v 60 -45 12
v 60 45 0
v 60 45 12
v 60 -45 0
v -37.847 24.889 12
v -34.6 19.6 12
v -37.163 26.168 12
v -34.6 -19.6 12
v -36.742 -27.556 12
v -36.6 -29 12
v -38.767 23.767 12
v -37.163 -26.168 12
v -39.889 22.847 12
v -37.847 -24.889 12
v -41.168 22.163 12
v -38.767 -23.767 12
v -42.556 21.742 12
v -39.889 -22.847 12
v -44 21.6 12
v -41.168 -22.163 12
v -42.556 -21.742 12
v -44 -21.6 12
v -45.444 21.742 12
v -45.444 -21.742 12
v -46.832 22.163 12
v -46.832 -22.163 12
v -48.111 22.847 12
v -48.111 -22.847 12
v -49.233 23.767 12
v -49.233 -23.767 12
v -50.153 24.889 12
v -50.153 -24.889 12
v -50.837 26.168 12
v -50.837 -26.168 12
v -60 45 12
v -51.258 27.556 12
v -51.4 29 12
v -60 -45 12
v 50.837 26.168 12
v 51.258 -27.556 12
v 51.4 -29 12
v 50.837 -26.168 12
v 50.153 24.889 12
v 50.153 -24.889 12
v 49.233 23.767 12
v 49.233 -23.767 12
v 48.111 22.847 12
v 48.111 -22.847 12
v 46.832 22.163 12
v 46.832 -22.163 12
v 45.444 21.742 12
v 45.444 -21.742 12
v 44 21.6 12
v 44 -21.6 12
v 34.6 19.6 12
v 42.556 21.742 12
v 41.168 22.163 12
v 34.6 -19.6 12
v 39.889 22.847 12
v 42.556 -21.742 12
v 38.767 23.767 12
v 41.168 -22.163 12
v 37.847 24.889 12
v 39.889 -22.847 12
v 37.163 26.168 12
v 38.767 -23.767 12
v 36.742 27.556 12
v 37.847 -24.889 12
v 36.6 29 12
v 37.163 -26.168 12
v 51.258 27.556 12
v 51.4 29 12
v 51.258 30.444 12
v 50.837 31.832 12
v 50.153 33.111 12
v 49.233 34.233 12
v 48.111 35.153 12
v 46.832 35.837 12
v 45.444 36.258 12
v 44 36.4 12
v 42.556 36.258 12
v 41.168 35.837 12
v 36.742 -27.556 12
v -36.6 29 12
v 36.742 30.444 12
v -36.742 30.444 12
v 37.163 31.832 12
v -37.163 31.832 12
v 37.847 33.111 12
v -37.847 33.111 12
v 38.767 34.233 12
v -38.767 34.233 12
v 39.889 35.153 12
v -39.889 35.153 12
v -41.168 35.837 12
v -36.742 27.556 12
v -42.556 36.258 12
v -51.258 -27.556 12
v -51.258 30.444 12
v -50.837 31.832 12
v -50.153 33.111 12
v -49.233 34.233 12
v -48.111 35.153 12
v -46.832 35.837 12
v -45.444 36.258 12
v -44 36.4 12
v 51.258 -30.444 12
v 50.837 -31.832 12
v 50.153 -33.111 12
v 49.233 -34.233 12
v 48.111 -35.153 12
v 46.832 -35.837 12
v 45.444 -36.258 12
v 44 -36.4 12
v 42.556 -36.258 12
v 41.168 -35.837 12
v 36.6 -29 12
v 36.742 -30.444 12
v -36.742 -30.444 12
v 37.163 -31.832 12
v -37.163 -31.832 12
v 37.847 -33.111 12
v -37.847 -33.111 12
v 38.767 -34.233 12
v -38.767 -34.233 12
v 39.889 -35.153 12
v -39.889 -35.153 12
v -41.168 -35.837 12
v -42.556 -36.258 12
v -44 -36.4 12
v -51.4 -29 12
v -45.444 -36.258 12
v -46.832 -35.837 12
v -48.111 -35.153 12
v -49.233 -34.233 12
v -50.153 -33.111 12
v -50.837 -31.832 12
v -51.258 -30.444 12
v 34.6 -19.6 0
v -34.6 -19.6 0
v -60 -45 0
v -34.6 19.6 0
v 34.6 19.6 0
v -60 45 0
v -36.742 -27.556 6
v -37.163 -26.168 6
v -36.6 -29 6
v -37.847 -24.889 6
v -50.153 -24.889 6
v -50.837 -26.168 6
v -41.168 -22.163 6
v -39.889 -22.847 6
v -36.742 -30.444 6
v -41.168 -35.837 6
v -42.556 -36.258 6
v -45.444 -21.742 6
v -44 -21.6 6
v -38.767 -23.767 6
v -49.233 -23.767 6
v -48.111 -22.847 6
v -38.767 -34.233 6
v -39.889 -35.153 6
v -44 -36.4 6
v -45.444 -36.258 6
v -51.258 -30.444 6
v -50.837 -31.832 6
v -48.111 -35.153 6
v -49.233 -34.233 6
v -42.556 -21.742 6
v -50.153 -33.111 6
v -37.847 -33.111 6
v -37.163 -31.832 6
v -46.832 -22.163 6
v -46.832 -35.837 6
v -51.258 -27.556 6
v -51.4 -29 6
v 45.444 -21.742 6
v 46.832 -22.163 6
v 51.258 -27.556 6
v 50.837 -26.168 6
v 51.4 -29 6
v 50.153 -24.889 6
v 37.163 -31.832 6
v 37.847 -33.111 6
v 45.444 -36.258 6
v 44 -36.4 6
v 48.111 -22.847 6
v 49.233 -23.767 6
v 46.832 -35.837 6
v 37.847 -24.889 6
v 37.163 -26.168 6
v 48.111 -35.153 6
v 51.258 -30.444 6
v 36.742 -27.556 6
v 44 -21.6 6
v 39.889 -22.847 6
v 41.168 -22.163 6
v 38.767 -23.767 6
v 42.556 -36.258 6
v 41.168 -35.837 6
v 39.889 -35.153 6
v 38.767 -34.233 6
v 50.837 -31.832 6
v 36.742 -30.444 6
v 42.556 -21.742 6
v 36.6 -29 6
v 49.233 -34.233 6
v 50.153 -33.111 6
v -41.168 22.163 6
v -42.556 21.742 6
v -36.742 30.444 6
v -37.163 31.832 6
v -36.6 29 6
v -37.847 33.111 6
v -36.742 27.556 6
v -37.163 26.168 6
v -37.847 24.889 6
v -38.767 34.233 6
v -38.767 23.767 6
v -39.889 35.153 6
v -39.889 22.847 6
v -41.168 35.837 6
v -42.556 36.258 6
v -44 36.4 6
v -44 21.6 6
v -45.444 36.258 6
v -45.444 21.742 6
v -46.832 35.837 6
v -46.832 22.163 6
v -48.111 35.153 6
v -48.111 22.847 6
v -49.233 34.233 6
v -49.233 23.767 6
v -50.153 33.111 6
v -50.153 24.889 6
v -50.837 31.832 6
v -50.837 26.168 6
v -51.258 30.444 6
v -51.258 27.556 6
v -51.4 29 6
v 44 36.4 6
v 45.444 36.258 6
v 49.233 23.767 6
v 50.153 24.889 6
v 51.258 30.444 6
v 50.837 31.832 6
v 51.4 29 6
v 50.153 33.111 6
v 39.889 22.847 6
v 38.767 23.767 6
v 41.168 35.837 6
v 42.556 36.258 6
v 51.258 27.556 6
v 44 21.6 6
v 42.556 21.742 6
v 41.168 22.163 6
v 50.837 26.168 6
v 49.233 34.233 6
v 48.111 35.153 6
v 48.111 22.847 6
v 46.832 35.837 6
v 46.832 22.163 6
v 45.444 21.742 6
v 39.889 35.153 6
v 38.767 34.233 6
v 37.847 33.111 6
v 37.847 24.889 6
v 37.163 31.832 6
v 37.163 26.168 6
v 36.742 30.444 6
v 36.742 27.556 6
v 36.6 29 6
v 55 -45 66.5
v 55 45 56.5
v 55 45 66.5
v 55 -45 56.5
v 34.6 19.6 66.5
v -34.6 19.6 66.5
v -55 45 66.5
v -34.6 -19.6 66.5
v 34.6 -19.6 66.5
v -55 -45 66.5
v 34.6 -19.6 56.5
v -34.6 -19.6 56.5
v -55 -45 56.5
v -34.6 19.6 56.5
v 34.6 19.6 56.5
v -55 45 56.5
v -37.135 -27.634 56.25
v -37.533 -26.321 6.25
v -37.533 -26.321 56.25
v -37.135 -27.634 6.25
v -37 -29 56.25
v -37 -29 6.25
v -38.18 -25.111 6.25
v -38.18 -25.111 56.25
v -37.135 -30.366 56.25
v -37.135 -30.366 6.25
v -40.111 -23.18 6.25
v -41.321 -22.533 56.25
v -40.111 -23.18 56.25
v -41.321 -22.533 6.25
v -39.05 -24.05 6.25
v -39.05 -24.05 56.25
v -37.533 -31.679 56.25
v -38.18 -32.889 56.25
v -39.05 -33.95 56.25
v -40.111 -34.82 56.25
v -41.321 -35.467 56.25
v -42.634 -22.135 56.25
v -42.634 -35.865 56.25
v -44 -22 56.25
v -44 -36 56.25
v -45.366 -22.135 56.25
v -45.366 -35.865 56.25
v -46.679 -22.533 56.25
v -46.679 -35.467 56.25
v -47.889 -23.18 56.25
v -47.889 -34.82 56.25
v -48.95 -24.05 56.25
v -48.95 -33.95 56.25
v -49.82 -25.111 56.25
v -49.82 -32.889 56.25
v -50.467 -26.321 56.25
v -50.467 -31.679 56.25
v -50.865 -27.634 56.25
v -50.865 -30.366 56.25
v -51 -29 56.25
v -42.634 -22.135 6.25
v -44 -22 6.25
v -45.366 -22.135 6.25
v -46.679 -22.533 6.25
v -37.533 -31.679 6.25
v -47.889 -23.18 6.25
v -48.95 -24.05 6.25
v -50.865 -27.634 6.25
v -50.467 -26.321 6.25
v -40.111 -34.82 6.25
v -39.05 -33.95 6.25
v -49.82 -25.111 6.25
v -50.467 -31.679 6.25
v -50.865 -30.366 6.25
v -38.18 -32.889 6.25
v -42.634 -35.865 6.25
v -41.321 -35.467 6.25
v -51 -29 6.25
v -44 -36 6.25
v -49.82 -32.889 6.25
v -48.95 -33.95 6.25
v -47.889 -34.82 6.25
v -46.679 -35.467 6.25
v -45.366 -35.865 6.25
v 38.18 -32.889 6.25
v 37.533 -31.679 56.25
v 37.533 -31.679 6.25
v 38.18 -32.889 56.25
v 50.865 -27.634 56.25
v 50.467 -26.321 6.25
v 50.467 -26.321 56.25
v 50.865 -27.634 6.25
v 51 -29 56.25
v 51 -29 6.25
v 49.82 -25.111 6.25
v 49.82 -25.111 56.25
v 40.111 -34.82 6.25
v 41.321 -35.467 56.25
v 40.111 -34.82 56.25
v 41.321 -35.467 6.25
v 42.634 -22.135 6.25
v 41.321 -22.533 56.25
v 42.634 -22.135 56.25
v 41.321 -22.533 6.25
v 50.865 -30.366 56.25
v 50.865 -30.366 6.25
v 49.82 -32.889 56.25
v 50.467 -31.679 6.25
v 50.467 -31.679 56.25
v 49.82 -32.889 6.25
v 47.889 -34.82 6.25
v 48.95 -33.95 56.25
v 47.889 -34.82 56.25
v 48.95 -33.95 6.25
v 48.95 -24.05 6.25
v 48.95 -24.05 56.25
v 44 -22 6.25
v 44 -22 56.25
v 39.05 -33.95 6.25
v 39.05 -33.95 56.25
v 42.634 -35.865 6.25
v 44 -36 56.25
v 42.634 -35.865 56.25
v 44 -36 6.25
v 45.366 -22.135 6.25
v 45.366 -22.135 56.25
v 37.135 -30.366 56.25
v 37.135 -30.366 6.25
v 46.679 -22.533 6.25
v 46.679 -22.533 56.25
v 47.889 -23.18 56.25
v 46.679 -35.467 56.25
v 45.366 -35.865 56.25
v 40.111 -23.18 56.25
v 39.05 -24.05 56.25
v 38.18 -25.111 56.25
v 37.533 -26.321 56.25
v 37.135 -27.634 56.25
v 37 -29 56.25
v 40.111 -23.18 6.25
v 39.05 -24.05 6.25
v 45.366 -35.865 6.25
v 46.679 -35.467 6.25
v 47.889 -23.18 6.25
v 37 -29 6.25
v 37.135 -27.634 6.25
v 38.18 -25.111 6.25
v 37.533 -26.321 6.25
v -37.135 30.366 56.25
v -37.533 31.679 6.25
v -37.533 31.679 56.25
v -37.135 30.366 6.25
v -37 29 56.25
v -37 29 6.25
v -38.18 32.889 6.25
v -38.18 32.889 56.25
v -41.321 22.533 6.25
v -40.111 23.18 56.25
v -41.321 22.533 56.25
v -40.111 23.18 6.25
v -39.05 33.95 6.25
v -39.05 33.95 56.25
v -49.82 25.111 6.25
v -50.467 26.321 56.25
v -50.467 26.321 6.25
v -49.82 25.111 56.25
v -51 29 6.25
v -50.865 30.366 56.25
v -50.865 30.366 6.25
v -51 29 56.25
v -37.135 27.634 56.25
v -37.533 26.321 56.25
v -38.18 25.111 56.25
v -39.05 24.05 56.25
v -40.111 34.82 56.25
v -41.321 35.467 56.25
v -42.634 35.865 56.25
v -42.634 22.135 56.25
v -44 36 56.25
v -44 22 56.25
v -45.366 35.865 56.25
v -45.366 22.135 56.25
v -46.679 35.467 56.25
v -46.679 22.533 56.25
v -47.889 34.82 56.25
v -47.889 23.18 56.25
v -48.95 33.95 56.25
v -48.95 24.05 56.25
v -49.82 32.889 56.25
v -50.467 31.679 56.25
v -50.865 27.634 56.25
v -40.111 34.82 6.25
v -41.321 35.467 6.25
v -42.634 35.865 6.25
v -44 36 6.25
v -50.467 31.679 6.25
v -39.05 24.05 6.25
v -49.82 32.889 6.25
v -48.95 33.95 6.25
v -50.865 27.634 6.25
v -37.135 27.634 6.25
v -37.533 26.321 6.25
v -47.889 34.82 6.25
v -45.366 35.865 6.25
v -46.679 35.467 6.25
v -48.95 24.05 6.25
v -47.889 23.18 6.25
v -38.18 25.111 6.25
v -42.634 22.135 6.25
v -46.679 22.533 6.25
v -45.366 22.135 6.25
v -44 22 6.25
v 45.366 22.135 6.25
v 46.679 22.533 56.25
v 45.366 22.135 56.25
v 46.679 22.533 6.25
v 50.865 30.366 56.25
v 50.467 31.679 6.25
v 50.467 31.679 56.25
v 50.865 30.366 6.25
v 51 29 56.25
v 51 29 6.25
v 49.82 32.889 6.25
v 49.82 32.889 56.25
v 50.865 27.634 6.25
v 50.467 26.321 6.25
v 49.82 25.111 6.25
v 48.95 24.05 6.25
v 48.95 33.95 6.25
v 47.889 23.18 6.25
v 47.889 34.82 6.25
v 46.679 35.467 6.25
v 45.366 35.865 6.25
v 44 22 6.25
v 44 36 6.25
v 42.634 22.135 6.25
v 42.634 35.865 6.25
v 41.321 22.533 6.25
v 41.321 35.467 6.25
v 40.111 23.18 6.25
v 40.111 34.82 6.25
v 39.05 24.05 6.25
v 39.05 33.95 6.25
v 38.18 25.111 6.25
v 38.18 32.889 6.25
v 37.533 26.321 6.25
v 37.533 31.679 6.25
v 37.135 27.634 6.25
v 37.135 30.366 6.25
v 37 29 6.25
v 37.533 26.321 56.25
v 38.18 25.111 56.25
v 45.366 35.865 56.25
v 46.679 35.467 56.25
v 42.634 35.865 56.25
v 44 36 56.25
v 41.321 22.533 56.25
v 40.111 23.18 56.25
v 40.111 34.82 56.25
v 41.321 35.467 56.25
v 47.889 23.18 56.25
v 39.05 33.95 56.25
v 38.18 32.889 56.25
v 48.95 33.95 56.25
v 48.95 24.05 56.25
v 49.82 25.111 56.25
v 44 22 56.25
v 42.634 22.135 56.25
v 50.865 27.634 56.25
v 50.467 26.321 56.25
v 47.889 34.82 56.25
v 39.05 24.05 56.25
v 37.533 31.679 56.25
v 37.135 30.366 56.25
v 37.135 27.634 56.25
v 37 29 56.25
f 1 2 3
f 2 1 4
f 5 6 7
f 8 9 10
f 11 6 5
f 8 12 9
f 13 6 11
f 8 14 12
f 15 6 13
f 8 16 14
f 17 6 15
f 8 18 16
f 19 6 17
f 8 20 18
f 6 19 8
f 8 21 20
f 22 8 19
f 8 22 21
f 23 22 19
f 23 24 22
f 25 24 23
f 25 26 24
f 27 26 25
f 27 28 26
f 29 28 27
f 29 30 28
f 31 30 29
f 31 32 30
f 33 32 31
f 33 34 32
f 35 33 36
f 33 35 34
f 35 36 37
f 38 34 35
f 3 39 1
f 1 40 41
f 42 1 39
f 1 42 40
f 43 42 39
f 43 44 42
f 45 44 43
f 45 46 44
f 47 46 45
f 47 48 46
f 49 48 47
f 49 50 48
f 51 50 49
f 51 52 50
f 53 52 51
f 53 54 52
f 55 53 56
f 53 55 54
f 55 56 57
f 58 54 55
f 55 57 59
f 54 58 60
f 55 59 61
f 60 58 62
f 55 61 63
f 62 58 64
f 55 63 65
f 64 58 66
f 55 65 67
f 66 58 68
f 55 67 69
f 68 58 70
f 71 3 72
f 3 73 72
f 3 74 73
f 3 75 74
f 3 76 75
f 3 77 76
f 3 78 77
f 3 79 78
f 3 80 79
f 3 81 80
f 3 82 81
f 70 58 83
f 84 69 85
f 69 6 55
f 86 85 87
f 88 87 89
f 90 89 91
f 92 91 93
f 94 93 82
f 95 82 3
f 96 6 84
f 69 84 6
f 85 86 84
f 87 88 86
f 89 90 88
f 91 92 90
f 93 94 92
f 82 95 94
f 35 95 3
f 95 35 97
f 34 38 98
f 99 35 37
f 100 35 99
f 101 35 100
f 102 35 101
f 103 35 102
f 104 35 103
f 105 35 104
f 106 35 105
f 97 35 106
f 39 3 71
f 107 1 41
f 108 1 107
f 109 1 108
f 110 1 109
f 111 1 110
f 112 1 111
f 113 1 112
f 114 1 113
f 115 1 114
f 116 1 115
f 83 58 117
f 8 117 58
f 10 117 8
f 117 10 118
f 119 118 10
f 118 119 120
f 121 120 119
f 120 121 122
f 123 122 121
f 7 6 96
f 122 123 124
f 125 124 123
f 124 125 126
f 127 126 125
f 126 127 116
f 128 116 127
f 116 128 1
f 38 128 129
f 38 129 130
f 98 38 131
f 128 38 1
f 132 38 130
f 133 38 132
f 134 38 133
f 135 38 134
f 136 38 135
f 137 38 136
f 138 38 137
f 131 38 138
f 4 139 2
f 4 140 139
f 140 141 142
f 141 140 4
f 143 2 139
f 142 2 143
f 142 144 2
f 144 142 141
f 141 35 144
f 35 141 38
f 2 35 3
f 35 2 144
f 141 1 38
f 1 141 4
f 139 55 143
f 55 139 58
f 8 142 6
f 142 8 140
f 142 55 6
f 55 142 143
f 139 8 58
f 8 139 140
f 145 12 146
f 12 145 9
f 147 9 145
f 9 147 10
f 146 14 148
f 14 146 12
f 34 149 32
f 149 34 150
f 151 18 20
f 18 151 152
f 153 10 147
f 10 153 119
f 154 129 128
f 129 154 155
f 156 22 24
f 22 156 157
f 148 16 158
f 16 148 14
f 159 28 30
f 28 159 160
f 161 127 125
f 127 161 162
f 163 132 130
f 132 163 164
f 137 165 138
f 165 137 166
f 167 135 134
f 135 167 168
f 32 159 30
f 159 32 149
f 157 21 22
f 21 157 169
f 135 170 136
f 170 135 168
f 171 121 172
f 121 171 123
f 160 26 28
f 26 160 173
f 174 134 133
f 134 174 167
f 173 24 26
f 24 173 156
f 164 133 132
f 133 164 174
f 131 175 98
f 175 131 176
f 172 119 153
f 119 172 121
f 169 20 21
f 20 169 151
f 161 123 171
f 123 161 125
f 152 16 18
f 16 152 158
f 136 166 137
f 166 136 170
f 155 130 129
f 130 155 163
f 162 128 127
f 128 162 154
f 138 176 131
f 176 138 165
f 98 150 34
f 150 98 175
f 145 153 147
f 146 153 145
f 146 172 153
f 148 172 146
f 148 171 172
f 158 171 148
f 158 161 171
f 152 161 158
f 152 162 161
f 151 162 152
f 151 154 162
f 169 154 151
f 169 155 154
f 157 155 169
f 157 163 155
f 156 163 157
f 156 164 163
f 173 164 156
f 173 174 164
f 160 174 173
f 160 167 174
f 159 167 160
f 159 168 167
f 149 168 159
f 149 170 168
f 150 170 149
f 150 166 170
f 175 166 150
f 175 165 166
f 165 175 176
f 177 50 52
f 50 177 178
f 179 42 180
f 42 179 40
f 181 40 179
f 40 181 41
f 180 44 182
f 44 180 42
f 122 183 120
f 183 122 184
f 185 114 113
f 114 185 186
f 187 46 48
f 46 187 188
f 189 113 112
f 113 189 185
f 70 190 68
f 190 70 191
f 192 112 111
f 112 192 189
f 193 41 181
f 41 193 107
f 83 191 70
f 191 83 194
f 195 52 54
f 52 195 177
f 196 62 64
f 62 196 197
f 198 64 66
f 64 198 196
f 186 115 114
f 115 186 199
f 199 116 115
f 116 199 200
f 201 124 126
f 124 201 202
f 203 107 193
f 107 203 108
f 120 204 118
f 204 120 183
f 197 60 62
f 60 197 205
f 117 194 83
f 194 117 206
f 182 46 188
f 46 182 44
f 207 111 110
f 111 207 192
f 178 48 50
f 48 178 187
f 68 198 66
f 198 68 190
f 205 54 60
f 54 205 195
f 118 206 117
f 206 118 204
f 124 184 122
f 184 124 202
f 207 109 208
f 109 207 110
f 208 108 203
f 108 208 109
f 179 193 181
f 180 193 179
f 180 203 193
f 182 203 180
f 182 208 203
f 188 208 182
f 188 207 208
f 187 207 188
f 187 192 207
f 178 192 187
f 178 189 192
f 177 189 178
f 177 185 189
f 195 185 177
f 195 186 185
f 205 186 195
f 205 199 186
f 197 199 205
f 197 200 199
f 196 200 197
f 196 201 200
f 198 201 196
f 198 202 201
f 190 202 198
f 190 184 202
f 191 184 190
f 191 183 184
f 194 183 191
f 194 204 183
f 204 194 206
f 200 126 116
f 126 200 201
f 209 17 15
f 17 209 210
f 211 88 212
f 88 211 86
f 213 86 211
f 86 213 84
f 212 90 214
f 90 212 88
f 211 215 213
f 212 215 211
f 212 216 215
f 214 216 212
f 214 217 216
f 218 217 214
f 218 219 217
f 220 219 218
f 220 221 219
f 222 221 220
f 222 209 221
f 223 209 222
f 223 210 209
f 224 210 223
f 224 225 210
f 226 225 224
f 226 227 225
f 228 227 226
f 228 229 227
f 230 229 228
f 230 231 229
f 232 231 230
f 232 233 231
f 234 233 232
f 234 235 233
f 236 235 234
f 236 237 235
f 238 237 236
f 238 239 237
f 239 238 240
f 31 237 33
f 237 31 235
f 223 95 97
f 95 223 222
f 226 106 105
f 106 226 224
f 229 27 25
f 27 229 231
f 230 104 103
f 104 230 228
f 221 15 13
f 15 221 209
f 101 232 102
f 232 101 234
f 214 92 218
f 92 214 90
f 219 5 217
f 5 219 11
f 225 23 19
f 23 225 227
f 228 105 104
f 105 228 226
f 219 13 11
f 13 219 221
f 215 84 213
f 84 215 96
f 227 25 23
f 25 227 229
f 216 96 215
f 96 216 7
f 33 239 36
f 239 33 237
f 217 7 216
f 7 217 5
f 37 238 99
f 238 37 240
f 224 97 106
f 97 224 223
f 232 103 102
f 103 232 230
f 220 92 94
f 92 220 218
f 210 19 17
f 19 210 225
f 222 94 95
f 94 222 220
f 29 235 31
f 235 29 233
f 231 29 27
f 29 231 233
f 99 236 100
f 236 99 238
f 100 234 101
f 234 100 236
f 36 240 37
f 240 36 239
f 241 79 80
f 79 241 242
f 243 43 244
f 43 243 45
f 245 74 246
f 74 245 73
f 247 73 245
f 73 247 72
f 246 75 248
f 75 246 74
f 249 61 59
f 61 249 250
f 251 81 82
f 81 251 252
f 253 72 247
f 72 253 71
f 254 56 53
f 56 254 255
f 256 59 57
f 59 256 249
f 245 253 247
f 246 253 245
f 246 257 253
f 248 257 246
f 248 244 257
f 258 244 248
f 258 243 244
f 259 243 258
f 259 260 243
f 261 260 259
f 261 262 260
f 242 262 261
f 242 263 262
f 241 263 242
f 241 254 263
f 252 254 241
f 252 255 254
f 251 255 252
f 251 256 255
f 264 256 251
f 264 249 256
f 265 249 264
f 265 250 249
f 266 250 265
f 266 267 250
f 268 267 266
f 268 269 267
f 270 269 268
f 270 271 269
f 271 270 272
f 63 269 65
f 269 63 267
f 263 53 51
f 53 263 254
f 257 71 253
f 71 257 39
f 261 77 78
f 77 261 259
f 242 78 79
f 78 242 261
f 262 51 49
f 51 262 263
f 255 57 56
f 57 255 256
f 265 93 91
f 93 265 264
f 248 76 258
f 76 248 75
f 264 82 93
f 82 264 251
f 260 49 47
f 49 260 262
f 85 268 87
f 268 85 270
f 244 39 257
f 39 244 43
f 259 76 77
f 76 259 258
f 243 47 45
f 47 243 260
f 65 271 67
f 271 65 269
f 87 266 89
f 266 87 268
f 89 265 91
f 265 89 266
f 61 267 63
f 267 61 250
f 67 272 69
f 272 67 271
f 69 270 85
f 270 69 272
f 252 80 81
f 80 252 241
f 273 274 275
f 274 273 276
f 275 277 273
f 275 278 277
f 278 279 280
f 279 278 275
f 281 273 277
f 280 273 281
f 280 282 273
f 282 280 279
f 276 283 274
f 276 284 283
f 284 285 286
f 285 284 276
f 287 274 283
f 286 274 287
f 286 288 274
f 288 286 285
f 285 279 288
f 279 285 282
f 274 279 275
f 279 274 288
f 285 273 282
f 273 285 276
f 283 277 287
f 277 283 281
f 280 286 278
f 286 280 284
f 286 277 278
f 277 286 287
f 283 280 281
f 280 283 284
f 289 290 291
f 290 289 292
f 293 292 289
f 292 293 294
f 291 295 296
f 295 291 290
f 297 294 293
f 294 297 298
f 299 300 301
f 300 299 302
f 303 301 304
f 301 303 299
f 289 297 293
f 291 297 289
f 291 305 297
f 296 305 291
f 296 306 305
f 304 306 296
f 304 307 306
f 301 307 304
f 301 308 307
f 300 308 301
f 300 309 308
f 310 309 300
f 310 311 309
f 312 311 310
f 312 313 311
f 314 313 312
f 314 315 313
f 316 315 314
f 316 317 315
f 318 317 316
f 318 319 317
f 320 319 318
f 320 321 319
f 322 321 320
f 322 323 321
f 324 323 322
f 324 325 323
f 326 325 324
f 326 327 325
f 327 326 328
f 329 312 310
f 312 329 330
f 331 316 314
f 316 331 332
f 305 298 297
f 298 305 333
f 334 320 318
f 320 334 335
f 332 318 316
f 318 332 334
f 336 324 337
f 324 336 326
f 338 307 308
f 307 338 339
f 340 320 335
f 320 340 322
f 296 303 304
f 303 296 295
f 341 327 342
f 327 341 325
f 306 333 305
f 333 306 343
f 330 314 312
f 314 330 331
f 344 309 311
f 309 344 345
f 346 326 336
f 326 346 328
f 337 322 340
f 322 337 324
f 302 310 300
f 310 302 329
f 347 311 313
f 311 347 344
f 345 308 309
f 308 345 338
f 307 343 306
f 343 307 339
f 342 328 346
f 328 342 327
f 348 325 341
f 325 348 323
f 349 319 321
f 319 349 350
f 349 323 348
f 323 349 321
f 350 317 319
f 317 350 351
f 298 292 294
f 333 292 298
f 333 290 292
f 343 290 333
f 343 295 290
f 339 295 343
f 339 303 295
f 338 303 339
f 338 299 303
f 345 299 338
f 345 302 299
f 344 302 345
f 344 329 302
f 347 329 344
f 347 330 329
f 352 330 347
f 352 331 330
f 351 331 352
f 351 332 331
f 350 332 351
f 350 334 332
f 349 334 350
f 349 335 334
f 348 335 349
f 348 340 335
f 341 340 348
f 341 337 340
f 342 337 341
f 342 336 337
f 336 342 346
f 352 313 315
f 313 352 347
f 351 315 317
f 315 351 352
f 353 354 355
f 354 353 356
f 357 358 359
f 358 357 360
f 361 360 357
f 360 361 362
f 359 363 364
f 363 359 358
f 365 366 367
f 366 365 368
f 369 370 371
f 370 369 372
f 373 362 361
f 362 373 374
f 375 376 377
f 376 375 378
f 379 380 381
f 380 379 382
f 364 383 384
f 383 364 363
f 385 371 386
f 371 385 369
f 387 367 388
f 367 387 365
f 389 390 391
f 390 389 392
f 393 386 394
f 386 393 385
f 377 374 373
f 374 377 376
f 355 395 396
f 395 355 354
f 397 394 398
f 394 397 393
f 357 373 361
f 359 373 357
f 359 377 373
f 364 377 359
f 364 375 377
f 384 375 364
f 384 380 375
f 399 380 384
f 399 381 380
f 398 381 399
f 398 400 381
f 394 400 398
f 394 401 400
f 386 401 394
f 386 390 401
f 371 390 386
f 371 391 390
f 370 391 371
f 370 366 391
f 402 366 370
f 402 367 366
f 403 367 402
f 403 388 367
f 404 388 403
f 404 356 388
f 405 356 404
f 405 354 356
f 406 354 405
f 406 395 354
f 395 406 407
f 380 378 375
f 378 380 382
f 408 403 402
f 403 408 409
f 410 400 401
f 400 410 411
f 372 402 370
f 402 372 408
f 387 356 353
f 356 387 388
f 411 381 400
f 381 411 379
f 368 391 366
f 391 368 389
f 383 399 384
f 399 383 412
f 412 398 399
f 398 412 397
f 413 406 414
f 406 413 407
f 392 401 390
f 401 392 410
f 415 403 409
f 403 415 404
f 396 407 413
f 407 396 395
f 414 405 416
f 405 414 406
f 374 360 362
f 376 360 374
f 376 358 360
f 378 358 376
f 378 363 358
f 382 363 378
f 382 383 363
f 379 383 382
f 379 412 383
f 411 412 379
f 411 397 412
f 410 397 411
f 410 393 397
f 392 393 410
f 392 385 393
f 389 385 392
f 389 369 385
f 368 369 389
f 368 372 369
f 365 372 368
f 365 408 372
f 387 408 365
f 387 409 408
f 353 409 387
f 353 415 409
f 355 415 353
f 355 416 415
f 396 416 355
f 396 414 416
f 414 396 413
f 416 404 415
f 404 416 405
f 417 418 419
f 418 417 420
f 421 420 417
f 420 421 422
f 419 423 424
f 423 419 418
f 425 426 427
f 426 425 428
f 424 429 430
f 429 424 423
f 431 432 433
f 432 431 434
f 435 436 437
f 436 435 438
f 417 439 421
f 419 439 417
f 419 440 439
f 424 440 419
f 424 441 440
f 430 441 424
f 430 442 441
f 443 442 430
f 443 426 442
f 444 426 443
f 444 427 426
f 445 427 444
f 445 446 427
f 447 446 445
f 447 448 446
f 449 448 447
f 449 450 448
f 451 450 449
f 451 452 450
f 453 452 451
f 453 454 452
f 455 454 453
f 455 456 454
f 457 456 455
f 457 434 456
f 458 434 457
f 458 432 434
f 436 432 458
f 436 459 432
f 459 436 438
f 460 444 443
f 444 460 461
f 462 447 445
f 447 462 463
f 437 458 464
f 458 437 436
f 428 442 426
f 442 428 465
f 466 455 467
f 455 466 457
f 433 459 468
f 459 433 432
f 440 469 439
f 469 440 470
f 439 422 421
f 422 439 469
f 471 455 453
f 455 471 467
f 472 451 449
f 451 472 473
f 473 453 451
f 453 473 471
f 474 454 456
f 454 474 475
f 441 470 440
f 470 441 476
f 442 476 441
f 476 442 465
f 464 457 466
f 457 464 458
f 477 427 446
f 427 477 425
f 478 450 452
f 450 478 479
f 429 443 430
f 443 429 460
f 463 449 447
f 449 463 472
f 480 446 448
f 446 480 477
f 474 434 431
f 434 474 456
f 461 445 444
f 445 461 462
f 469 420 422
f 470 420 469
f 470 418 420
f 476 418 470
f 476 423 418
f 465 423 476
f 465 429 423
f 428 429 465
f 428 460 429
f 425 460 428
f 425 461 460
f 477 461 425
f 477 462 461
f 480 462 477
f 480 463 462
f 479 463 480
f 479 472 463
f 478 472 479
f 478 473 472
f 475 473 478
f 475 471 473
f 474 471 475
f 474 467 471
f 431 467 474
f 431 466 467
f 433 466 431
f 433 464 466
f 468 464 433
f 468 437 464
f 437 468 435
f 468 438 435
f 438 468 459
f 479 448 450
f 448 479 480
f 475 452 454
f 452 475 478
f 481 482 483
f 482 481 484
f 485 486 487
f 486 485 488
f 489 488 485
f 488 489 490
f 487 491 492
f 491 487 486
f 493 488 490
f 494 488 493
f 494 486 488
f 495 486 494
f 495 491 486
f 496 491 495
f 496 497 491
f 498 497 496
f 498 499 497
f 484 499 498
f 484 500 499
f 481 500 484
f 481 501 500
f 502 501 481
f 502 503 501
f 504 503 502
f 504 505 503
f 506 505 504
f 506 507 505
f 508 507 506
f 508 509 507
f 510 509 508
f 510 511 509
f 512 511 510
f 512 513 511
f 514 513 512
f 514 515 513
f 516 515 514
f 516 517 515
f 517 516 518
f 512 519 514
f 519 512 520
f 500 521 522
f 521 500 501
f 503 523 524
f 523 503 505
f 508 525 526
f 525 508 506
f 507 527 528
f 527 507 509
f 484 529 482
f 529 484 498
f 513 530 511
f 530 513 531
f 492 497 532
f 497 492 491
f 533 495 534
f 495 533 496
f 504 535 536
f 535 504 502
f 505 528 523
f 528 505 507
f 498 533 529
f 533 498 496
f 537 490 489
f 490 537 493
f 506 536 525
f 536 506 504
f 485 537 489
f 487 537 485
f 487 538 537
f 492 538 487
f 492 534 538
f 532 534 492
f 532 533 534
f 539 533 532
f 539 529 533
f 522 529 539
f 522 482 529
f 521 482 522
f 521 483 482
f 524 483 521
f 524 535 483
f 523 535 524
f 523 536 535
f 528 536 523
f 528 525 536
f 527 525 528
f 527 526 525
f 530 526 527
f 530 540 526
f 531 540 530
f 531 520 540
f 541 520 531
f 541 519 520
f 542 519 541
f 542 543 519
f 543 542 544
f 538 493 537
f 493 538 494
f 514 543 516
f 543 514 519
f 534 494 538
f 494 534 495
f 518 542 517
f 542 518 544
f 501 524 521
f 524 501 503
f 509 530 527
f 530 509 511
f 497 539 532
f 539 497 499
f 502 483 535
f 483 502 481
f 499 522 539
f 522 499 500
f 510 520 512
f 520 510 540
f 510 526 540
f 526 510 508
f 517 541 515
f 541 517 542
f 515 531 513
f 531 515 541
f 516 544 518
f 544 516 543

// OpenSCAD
$fn = 32;

// ------------------------------------------------------------------------
// Frame cube: base 120 x 90 mm, posts 50 mm tall
// Every part is its own module, assembly() places every instance.
// ------------------------------------------------------------------------

// --- part 1 ---
module base_frame() {
  difference() {
    translate([-60, -45, 0]) cube([120, 90, 12]);
    translate([-34.6, -19.6, -1]) cube([69.2, 39.2, 14]);
    translate([-44, -29, 6]) cylinder(h = 7, d = 14.8);
    translate([44, -29, 6]) cylinder(h = 7, d = 14.8);
    translate([-44, 29, 6]) cylinder(h = 7, d = 14.8);
    translate([44, 29, 6]) cylinder(h = 7, d = 14.8);
  }
}

// --- part 2 ---
module corner_post() {
  cylinder(h = 50, d = 14);
}

// --- part 3 ---
module top_frame() {
  difference() {
    translate([-55, -45, 0]) cube([110, 90, 10]);
    translate([-34.6, -19.6, -1]) cube([69.2, 39.2, 12]);
  }
}

// --- assembly ---
module assembly() {
  color([0.80, 0.24, 0.20]) translate([0, 0, 0]) rotate([0, 0, 0]) base_frame();
  color([0.20, 0.45, 0.75]) translate([-44, -29, 6.25]) rotate([0, 0, 0]) corner_post();
  color([0.25, 0.62, 0.32]) translate([44, -29, 6.25]) rotate([0, 0, 0]) corner_post();
  color([0.92, 0.70, 0.18]) translate([-44, 29, 6.25]) rotate([0, 0, 0]) corner_post();
  color([0.58, 0.35, 0.70]) translate([44, 29, 6.25]) rotate([0, 0, 0]) corner_post();
  color([0.16, 0.66, 0.66]) translate([0, 0, 56.5]) rotate([0, 0, 0]) top_frame();
}

assembly();
